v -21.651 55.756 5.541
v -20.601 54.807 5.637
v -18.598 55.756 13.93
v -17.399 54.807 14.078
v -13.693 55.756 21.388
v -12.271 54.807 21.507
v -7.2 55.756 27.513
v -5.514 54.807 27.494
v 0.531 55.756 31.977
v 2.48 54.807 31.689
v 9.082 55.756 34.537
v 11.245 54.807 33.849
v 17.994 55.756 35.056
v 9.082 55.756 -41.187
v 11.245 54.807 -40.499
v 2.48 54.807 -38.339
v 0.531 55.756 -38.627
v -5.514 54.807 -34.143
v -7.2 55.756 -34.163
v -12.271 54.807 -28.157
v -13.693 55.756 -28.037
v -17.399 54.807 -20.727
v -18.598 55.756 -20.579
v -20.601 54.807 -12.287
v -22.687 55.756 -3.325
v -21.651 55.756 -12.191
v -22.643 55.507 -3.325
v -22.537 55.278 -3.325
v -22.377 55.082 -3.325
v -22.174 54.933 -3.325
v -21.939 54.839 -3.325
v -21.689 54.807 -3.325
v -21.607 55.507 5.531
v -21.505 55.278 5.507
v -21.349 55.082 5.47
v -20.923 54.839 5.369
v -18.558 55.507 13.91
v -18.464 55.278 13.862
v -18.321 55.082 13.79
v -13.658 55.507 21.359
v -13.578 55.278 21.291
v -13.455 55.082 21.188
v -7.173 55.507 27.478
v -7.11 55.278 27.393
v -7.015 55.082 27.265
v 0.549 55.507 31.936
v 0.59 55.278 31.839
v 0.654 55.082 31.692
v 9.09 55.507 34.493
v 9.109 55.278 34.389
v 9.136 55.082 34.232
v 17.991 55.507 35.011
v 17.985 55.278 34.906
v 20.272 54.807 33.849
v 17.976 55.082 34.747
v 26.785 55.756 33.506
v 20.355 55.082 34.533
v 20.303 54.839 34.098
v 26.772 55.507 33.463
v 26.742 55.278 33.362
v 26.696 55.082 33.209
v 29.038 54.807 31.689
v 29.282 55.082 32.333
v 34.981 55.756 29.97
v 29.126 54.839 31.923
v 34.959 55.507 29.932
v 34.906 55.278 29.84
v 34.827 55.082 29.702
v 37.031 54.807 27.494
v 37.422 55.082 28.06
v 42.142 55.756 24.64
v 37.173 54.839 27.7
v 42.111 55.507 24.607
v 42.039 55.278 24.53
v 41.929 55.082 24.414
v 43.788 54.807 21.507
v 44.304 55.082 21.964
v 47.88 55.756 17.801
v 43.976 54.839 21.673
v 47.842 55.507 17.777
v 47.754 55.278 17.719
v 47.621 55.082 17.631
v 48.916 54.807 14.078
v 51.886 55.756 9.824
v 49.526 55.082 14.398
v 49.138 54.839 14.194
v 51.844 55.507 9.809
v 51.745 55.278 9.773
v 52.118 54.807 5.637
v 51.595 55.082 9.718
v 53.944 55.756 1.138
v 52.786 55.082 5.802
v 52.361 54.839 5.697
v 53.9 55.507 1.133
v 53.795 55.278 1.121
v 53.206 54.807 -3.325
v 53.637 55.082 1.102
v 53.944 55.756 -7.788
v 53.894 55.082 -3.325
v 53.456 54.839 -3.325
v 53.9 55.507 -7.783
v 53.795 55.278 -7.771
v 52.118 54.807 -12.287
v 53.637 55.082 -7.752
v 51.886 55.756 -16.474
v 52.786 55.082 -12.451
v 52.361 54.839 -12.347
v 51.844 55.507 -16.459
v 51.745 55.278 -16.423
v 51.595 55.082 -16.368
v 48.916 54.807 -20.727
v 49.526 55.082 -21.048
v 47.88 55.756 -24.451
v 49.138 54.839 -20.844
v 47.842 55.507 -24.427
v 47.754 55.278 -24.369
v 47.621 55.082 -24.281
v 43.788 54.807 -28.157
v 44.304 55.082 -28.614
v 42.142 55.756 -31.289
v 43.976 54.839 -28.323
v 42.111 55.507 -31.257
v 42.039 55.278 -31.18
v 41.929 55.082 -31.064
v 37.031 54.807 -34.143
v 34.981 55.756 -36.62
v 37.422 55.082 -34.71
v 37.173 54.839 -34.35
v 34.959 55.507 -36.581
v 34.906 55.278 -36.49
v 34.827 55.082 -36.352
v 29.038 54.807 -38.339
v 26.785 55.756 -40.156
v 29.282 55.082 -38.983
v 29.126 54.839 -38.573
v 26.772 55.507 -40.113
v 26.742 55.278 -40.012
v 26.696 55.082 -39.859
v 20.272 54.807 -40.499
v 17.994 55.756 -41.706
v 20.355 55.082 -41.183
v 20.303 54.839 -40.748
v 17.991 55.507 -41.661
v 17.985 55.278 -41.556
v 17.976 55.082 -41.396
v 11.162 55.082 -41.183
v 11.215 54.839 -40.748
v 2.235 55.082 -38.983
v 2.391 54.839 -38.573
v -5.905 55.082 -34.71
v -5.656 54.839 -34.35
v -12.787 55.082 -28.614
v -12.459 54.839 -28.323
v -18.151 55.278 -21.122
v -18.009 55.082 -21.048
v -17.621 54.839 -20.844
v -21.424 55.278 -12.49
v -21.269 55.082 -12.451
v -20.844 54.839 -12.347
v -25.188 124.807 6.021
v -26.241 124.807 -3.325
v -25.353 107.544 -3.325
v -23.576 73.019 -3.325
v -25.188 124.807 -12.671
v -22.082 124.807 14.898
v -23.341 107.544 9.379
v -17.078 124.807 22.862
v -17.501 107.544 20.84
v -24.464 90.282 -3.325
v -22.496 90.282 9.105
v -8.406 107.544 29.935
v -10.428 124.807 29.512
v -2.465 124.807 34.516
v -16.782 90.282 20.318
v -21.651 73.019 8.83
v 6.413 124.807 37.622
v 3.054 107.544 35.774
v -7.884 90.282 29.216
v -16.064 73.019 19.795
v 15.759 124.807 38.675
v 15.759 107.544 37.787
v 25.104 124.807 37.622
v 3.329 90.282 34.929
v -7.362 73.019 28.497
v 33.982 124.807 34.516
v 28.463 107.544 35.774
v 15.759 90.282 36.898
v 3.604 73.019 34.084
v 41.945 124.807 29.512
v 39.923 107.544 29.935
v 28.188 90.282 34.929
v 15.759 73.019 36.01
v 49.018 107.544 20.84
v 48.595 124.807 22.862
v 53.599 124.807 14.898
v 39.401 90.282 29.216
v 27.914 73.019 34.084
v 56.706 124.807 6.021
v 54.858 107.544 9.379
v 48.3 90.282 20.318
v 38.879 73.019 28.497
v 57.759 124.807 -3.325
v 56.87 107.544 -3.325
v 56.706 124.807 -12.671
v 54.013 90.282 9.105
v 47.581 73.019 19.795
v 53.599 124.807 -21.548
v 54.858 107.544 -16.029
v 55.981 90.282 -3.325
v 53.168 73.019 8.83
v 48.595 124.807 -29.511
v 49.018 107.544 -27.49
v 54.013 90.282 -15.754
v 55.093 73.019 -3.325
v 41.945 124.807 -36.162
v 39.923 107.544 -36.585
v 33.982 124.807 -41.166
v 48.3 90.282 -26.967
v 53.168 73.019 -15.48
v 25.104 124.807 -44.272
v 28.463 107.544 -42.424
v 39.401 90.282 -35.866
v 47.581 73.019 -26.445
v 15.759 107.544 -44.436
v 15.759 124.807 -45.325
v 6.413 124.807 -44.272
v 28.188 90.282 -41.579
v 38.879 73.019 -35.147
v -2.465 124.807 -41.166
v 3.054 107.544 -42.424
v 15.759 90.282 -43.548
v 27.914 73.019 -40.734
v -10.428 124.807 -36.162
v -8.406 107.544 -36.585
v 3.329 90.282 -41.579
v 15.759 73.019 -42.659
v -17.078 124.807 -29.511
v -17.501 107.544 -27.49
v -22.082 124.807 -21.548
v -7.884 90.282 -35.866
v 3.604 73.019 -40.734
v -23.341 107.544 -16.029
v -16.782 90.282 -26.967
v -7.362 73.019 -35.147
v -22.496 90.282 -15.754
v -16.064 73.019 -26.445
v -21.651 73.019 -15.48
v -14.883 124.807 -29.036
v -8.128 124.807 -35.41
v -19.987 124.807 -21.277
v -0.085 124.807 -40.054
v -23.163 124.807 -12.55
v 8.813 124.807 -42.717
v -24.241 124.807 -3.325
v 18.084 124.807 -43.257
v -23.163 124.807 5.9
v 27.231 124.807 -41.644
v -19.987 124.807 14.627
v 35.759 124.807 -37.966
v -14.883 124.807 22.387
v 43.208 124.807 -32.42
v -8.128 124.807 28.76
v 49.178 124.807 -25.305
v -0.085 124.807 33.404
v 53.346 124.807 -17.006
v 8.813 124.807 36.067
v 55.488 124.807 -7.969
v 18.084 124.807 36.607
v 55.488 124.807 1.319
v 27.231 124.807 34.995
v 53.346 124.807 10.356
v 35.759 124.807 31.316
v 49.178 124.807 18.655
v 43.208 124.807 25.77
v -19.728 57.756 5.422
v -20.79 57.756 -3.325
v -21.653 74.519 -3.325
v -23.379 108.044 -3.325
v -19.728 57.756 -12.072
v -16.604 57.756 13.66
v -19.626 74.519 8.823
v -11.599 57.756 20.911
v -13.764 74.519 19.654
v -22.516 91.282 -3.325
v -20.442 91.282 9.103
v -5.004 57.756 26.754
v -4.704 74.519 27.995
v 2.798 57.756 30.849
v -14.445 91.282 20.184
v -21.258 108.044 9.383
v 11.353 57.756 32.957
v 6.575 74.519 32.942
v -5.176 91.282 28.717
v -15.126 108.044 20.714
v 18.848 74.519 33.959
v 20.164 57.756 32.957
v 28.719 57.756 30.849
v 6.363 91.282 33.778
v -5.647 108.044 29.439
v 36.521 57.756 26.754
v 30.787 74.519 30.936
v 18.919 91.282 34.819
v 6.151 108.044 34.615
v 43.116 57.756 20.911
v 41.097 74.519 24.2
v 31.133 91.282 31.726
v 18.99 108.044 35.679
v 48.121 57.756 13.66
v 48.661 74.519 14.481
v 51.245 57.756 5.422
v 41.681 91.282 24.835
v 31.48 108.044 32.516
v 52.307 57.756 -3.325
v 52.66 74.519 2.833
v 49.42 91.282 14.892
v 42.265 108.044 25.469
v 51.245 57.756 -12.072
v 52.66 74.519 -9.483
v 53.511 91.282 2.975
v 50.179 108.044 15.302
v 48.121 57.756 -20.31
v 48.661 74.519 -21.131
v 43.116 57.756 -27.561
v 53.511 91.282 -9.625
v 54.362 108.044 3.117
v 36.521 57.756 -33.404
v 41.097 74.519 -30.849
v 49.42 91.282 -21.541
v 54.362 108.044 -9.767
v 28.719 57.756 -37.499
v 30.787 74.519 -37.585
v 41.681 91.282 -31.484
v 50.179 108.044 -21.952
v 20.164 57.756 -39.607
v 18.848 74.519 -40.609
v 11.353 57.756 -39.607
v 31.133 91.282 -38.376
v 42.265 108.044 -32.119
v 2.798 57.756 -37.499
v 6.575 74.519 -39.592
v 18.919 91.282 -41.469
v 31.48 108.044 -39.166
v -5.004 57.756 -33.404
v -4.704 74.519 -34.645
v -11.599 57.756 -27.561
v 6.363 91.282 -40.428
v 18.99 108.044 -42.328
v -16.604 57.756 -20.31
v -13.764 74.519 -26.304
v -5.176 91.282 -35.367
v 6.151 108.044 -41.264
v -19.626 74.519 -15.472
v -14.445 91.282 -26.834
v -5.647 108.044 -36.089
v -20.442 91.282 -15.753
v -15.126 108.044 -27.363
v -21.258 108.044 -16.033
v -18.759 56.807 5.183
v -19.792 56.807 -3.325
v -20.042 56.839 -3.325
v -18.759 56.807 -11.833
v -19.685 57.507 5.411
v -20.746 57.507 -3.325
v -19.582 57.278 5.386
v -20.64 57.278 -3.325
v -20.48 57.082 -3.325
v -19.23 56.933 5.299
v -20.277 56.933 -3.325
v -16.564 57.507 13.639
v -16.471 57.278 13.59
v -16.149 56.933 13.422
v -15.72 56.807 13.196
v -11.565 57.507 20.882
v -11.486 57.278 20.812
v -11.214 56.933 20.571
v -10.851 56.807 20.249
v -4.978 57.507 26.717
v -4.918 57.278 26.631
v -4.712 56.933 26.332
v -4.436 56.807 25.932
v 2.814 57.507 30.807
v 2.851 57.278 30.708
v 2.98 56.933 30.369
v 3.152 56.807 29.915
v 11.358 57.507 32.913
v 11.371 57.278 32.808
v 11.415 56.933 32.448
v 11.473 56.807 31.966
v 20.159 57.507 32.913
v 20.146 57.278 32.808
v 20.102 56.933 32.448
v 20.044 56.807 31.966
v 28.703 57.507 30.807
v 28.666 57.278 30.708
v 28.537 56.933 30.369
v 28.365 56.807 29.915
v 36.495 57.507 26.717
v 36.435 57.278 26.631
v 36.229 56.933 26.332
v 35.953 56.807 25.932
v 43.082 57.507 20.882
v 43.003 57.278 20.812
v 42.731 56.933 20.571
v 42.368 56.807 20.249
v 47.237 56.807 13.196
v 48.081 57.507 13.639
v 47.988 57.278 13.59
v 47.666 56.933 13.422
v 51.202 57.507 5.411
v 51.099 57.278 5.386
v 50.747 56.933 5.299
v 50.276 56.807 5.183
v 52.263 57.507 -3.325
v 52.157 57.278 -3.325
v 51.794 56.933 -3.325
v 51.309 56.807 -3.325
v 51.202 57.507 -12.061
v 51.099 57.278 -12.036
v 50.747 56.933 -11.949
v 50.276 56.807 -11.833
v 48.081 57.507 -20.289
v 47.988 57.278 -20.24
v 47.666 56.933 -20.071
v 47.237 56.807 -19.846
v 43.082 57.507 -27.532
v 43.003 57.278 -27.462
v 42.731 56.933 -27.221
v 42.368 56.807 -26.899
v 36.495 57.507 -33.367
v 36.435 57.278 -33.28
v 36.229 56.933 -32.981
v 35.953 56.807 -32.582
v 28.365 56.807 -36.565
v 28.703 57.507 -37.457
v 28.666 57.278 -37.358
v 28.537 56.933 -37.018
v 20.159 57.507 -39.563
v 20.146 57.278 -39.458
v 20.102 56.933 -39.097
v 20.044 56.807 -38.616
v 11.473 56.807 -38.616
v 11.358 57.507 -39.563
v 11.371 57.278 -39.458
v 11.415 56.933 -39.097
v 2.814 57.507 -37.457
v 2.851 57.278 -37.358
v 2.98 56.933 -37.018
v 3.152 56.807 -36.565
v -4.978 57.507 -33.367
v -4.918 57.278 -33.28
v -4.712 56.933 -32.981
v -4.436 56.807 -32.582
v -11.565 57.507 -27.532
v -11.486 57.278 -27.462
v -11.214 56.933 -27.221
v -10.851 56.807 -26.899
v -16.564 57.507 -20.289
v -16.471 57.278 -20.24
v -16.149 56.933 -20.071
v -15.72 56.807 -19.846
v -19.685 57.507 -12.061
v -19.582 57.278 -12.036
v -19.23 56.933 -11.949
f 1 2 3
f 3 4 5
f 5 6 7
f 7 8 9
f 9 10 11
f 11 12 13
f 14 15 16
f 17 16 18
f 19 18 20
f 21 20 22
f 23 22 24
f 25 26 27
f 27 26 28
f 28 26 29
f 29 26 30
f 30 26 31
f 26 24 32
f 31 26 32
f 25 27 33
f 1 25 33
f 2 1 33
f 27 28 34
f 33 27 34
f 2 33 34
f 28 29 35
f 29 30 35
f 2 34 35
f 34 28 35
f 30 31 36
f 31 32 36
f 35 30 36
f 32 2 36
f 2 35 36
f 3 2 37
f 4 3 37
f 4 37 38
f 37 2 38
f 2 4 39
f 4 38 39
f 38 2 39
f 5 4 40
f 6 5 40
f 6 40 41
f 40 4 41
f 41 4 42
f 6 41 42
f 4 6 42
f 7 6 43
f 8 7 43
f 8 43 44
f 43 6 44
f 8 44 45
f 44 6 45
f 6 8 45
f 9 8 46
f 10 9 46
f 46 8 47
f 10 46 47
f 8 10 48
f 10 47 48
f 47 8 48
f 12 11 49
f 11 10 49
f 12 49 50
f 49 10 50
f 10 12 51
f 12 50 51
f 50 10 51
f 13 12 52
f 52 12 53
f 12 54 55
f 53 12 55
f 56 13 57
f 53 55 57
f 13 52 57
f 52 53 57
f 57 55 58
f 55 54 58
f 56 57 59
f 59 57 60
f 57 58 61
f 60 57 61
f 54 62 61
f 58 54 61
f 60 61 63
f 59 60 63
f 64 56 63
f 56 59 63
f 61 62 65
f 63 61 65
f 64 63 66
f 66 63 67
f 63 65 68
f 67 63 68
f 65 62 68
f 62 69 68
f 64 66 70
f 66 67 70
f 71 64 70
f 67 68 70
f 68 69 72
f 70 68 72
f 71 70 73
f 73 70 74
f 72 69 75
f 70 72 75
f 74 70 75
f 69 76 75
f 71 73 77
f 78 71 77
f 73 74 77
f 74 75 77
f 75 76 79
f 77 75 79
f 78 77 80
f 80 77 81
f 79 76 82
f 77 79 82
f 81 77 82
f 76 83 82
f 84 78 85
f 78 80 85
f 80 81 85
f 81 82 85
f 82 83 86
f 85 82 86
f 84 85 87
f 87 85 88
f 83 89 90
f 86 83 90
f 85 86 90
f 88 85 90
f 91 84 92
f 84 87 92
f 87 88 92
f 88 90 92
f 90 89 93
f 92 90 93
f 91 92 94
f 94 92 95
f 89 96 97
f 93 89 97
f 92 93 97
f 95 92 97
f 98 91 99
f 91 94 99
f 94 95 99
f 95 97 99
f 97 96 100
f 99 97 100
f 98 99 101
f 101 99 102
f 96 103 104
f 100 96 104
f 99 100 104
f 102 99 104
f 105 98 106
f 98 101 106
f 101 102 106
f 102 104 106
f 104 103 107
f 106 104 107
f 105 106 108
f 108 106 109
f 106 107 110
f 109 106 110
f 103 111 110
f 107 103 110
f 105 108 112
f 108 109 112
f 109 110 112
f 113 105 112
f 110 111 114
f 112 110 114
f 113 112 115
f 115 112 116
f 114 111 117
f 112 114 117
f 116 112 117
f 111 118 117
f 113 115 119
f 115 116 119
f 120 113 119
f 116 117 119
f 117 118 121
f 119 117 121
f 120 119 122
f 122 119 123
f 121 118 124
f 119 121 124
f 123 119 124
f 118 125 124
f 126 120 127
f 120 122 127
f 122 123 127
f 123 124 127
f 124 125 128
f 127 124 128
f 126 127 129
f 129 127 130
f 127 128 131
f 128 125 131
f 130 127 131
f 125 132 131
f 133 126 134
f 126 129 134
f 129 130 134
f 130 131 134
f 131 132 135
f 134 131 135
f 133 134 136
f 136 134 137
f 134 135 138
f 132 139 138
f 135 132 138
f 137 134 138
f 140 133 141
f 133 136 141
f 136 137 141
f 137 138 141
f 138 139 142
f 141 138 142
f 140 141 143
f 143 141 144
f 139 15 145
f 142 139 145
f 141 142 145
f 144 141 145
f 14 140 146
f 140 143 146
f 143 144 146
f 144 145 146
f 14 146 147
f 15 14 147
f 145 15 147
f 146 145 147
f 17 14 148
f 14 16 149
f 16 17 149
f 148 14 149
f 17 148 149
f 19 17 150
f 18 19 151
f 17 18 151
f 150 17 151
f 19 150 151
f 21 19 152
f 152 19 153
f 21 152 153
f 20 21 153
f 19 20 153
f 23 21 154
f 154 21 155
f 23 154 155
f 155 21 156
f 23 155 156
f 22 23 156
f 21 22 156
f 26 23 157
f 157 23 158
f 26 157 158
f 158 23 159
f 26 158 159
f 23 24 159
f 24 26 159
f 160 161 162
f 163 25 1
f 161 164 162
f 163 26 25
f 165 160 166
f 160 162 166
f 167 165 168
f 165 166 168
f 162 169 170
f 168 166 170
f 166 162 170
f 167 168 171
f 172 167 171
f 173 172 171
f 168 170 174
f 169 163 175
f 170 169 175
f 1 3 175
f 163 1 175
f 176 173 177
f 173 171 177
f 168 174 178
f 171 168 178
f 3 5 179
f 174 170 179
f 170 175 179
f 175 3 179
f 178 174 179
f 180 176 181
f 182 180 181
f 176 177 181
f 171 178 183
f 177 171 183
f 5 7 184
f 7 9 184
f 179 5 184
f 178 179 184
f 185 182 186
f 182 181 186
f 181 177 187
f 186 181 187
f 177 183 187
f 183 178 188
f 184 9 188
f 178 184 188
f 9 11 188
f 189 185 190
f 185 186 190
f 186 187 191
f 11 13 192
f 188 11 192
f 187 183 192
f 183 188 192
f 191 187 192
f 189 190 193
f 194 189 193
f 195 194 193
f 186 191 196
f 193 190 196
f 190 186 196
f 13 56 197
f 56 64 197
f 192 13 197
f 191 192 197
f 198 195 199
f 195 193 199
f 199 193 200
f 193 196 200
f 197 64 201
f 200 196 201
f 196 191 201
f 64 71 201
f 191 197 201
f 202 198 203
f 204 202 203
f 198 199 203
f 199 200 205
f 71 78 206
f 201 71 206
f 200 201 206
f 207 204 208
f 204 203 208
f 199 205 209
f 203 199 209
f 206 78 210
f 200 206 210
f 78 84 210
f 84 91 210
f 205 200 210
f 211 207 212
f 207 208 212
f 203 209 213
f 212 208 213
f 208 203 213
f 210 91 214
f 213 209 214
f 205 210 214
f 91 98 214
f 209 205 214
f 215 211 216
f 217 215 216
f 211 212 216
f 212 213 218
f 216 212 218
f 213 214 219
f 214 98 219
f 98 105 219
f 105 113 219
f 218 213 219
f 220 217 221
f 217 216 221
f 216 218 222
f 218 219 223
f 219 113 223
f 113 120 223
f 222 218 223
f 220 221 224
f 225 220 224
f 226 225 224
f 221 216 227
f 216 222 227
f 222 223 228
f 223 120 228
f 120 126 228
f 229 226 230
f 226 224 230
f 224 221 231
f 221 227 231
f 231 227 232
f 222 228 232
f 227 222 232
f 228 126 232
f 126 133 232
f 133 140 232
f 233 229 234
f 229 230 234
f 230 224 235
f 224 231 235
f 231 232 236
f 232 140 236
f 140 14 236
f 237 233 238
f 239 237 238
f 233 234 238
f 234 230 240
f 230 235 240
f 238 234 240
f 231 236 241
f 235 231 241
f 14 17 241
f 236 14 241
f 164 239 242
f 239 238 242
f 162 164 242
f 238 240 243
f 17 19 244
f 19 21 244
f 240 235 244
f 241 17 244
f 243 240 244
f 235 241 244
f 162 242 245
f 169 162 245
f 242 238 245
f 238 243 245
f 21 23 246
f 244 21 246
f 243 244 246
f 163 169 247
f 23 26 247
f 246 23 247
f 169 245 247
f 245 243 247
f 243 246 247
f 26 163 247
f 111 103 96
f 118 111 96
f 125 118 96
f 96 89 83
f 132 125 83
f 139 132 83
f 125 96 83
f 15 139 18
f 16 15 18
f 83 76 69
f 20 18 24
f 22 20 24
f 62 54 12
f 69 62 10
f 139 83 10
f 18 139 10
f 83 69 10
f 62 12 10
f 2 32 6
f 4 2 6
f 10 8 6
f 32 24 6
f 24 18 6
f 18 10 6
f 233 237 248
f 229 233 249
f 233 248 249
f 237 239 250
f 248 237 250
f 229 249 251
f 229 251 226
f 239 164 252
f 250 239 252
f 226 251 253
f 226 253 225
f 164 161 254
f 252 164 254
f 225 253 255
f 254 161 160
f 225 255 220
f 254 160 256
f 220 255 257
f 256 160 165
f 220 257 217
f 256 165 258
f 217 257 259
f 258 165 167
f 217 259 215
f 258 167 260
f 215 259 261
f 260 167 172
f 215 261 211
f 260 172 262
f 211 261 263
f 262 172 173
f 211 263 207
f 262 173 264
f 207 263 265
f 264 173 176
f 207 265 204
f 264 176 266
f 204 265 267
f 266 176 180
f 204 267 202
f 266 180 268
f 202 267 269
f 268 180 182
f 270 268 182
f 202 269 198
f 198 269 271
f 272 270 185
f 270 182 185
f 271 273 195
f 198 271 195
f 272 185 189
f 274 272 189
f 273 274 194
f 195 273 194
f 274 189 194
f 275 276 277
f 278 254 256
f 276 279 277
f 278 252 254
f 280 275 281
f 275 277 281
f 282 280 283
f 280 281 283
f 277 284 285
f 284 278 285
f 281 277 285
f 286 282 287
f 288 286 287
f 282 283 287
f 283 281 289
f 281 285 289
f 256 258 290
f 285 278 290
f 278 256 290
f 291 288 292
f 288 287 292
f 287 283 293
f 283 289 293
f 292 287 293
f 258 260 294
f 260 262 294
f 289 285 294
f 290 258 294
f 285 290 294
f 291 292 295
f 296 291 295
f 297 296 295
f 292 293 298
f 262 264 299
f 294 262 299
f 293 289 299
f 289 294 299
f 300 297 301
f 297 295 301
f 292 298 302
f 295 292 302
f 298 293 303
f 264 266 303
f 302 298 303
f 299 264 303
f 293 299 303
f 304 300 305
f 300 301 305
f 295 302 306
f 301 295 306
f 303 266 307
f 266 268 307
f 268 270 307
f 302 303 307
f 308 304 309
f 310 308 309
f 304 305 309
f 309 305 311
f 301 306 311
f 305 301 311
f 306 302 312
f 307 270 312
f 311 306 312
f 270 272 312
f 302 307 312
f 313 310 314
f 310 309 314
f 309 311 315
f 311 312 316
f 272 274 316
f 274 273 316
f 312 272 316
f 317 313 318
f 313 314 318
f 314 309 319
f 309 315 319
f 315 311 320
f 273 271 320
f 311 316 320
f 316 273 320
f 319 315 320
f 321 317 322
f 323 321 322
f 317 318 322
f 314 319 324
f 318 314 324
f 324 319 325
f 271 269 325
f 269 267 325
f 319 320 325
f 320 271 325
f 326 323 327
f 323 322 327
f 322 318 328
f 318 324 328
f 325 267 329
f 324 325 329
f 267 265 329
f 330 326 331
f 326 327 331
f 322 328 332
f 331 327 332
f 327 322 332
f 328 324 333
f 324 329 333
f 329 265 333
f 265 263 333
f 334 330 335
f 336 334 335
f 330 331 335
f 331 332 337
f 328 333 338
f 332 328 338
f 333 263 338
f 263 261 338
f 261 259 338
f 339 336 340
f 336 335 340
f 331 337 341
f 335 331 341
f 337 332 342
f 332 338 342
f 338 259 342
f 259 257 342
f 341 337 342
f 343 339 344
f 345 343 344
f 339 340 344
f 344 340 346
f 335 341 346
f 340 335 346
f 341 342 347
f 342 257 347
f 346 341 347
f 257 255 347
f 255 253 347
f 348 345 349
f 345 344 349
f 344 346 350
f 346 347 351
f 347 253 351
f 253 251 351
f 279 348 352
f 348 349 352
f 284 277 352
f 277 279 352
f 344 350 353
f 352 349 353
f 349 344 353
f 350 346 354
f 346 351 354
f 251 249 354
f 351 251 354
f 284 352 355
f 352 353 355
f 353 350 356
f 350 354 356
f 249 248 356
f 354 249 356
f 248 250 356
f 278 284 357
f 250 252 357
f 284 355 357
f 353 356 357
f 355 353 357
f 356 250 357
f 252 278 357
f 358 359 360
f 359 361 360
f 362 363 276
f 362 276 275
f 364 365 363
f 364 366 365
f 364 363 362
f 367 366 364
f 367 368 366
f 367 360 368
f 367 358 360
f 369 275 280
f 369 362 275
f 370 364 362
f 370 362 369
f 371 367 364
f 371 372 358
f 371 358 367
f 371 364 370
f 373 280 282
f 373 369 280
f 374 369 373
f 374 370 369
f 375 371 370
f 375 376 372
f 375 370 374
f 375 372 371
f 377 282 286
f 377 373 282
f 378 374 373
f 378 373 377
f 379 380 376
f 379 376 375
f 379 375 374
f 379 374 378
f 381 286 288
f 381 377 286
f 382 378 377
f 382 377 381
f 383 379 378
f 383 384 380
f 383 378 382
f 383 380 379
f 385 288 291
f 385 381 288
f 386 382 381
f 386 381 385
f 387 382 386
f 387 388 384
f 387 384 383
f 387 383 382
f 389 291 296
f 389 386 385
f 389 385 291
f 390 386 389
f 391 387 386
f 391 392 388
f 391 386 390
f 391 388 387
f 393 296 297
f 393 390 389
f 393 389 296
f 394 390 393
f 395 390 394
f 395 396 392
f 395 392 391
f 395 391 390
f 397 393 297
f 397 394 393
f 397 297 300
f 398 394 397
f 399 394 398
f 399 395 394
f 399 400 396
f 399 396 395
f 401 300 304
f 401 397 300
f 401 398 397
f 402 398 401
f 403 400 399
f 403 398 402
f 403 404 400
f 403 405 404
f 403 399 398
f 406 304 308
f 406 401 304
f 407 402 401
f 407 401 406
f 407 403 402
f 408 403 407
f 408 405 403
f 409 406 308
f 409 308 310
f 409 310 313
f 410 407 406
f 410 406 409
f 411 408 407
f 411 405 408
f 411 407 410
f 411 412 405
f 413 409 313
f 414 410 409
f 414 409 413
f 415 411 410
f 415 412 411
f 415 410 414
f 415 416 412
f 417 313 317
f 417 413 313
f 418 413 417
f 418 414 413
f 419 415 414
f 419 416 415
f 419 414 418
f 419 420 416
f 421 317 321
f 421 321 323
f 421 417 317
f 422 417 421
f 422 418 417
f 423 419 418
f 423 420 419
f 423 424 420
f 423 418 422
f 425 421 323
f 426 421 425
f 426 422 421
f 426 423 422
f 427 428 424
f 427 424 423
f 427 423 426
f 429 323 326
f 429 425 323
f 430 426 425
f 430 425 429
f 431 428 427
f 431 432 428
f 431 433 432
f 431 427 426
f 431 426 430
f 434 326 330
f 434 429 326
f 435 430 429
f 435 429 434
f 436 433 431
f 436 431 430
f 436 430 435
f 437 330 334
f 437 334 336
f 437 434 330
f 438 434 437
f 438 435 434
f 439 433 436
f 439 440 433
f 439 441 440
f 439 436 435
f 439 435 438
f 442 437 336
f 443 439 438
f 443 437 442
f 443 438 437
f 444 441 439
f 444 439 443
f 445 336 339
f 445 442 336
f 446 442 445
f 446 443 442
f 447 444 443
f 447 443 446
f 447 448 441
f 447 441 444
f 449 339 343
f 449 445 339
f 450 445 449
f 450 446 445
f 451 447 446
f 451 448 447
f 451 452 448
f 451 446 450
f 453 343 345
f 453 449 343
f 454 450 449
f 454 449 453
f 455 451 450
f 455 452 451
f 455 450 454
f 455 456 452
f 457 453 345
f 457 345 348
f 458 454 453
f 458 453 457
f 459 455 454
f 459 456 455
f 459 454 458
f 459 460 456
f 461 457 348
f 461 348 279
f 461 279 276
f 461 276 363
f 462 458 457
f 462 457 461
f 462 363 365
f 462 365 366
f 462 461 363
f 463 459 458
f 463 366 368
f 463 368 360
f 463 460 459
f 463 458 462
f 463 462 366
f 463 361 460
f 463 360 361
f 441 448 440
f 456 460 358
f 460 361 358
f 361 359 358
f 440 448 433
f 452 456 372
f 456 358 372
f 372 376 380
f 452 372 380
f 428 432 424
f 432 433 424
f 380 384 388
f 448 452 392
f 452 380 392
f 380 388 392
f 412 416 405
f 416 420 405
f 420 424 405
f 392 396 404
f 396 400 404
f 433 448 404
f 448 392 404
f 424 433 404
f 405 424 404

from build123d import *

# Parameters (mm, degrees)
FILLET_R    = 1
FILLET001_R = 1


with BuildPart() as part:
    # Sketch → Revolution (revolve)
    with BuildSketch(Plane.XY):
        Polygon((0, 0), (-36.5, 0), (-40, 68), (-42, 68), (-38.397059, -2), (0, -2), align=None)
    revolve(axis=Axis((0, 0, 0), (0, 1, 0)))

    # Fillet
    fillet_edges = [part.edges().sort_by_distance(p)[0] for p in [
        (38.397059, -2, 0),
    ]]
    fillet(fillet_edges, radius=FILLET_R)

    # Fillet001
    fillet001_edges = [part.edges().sort_by_distance(p)[0] for p in [
        (36.5, 0, 0),
    ]]
    fillet(fillet001_edges, radius=FILLET001_R)


with BuildPart() as part_1:
    # Body001 placement: moved
    add(part.part.moved(Location((15.758551, 56.807331, -3.324877))))


solid = part_1.part
